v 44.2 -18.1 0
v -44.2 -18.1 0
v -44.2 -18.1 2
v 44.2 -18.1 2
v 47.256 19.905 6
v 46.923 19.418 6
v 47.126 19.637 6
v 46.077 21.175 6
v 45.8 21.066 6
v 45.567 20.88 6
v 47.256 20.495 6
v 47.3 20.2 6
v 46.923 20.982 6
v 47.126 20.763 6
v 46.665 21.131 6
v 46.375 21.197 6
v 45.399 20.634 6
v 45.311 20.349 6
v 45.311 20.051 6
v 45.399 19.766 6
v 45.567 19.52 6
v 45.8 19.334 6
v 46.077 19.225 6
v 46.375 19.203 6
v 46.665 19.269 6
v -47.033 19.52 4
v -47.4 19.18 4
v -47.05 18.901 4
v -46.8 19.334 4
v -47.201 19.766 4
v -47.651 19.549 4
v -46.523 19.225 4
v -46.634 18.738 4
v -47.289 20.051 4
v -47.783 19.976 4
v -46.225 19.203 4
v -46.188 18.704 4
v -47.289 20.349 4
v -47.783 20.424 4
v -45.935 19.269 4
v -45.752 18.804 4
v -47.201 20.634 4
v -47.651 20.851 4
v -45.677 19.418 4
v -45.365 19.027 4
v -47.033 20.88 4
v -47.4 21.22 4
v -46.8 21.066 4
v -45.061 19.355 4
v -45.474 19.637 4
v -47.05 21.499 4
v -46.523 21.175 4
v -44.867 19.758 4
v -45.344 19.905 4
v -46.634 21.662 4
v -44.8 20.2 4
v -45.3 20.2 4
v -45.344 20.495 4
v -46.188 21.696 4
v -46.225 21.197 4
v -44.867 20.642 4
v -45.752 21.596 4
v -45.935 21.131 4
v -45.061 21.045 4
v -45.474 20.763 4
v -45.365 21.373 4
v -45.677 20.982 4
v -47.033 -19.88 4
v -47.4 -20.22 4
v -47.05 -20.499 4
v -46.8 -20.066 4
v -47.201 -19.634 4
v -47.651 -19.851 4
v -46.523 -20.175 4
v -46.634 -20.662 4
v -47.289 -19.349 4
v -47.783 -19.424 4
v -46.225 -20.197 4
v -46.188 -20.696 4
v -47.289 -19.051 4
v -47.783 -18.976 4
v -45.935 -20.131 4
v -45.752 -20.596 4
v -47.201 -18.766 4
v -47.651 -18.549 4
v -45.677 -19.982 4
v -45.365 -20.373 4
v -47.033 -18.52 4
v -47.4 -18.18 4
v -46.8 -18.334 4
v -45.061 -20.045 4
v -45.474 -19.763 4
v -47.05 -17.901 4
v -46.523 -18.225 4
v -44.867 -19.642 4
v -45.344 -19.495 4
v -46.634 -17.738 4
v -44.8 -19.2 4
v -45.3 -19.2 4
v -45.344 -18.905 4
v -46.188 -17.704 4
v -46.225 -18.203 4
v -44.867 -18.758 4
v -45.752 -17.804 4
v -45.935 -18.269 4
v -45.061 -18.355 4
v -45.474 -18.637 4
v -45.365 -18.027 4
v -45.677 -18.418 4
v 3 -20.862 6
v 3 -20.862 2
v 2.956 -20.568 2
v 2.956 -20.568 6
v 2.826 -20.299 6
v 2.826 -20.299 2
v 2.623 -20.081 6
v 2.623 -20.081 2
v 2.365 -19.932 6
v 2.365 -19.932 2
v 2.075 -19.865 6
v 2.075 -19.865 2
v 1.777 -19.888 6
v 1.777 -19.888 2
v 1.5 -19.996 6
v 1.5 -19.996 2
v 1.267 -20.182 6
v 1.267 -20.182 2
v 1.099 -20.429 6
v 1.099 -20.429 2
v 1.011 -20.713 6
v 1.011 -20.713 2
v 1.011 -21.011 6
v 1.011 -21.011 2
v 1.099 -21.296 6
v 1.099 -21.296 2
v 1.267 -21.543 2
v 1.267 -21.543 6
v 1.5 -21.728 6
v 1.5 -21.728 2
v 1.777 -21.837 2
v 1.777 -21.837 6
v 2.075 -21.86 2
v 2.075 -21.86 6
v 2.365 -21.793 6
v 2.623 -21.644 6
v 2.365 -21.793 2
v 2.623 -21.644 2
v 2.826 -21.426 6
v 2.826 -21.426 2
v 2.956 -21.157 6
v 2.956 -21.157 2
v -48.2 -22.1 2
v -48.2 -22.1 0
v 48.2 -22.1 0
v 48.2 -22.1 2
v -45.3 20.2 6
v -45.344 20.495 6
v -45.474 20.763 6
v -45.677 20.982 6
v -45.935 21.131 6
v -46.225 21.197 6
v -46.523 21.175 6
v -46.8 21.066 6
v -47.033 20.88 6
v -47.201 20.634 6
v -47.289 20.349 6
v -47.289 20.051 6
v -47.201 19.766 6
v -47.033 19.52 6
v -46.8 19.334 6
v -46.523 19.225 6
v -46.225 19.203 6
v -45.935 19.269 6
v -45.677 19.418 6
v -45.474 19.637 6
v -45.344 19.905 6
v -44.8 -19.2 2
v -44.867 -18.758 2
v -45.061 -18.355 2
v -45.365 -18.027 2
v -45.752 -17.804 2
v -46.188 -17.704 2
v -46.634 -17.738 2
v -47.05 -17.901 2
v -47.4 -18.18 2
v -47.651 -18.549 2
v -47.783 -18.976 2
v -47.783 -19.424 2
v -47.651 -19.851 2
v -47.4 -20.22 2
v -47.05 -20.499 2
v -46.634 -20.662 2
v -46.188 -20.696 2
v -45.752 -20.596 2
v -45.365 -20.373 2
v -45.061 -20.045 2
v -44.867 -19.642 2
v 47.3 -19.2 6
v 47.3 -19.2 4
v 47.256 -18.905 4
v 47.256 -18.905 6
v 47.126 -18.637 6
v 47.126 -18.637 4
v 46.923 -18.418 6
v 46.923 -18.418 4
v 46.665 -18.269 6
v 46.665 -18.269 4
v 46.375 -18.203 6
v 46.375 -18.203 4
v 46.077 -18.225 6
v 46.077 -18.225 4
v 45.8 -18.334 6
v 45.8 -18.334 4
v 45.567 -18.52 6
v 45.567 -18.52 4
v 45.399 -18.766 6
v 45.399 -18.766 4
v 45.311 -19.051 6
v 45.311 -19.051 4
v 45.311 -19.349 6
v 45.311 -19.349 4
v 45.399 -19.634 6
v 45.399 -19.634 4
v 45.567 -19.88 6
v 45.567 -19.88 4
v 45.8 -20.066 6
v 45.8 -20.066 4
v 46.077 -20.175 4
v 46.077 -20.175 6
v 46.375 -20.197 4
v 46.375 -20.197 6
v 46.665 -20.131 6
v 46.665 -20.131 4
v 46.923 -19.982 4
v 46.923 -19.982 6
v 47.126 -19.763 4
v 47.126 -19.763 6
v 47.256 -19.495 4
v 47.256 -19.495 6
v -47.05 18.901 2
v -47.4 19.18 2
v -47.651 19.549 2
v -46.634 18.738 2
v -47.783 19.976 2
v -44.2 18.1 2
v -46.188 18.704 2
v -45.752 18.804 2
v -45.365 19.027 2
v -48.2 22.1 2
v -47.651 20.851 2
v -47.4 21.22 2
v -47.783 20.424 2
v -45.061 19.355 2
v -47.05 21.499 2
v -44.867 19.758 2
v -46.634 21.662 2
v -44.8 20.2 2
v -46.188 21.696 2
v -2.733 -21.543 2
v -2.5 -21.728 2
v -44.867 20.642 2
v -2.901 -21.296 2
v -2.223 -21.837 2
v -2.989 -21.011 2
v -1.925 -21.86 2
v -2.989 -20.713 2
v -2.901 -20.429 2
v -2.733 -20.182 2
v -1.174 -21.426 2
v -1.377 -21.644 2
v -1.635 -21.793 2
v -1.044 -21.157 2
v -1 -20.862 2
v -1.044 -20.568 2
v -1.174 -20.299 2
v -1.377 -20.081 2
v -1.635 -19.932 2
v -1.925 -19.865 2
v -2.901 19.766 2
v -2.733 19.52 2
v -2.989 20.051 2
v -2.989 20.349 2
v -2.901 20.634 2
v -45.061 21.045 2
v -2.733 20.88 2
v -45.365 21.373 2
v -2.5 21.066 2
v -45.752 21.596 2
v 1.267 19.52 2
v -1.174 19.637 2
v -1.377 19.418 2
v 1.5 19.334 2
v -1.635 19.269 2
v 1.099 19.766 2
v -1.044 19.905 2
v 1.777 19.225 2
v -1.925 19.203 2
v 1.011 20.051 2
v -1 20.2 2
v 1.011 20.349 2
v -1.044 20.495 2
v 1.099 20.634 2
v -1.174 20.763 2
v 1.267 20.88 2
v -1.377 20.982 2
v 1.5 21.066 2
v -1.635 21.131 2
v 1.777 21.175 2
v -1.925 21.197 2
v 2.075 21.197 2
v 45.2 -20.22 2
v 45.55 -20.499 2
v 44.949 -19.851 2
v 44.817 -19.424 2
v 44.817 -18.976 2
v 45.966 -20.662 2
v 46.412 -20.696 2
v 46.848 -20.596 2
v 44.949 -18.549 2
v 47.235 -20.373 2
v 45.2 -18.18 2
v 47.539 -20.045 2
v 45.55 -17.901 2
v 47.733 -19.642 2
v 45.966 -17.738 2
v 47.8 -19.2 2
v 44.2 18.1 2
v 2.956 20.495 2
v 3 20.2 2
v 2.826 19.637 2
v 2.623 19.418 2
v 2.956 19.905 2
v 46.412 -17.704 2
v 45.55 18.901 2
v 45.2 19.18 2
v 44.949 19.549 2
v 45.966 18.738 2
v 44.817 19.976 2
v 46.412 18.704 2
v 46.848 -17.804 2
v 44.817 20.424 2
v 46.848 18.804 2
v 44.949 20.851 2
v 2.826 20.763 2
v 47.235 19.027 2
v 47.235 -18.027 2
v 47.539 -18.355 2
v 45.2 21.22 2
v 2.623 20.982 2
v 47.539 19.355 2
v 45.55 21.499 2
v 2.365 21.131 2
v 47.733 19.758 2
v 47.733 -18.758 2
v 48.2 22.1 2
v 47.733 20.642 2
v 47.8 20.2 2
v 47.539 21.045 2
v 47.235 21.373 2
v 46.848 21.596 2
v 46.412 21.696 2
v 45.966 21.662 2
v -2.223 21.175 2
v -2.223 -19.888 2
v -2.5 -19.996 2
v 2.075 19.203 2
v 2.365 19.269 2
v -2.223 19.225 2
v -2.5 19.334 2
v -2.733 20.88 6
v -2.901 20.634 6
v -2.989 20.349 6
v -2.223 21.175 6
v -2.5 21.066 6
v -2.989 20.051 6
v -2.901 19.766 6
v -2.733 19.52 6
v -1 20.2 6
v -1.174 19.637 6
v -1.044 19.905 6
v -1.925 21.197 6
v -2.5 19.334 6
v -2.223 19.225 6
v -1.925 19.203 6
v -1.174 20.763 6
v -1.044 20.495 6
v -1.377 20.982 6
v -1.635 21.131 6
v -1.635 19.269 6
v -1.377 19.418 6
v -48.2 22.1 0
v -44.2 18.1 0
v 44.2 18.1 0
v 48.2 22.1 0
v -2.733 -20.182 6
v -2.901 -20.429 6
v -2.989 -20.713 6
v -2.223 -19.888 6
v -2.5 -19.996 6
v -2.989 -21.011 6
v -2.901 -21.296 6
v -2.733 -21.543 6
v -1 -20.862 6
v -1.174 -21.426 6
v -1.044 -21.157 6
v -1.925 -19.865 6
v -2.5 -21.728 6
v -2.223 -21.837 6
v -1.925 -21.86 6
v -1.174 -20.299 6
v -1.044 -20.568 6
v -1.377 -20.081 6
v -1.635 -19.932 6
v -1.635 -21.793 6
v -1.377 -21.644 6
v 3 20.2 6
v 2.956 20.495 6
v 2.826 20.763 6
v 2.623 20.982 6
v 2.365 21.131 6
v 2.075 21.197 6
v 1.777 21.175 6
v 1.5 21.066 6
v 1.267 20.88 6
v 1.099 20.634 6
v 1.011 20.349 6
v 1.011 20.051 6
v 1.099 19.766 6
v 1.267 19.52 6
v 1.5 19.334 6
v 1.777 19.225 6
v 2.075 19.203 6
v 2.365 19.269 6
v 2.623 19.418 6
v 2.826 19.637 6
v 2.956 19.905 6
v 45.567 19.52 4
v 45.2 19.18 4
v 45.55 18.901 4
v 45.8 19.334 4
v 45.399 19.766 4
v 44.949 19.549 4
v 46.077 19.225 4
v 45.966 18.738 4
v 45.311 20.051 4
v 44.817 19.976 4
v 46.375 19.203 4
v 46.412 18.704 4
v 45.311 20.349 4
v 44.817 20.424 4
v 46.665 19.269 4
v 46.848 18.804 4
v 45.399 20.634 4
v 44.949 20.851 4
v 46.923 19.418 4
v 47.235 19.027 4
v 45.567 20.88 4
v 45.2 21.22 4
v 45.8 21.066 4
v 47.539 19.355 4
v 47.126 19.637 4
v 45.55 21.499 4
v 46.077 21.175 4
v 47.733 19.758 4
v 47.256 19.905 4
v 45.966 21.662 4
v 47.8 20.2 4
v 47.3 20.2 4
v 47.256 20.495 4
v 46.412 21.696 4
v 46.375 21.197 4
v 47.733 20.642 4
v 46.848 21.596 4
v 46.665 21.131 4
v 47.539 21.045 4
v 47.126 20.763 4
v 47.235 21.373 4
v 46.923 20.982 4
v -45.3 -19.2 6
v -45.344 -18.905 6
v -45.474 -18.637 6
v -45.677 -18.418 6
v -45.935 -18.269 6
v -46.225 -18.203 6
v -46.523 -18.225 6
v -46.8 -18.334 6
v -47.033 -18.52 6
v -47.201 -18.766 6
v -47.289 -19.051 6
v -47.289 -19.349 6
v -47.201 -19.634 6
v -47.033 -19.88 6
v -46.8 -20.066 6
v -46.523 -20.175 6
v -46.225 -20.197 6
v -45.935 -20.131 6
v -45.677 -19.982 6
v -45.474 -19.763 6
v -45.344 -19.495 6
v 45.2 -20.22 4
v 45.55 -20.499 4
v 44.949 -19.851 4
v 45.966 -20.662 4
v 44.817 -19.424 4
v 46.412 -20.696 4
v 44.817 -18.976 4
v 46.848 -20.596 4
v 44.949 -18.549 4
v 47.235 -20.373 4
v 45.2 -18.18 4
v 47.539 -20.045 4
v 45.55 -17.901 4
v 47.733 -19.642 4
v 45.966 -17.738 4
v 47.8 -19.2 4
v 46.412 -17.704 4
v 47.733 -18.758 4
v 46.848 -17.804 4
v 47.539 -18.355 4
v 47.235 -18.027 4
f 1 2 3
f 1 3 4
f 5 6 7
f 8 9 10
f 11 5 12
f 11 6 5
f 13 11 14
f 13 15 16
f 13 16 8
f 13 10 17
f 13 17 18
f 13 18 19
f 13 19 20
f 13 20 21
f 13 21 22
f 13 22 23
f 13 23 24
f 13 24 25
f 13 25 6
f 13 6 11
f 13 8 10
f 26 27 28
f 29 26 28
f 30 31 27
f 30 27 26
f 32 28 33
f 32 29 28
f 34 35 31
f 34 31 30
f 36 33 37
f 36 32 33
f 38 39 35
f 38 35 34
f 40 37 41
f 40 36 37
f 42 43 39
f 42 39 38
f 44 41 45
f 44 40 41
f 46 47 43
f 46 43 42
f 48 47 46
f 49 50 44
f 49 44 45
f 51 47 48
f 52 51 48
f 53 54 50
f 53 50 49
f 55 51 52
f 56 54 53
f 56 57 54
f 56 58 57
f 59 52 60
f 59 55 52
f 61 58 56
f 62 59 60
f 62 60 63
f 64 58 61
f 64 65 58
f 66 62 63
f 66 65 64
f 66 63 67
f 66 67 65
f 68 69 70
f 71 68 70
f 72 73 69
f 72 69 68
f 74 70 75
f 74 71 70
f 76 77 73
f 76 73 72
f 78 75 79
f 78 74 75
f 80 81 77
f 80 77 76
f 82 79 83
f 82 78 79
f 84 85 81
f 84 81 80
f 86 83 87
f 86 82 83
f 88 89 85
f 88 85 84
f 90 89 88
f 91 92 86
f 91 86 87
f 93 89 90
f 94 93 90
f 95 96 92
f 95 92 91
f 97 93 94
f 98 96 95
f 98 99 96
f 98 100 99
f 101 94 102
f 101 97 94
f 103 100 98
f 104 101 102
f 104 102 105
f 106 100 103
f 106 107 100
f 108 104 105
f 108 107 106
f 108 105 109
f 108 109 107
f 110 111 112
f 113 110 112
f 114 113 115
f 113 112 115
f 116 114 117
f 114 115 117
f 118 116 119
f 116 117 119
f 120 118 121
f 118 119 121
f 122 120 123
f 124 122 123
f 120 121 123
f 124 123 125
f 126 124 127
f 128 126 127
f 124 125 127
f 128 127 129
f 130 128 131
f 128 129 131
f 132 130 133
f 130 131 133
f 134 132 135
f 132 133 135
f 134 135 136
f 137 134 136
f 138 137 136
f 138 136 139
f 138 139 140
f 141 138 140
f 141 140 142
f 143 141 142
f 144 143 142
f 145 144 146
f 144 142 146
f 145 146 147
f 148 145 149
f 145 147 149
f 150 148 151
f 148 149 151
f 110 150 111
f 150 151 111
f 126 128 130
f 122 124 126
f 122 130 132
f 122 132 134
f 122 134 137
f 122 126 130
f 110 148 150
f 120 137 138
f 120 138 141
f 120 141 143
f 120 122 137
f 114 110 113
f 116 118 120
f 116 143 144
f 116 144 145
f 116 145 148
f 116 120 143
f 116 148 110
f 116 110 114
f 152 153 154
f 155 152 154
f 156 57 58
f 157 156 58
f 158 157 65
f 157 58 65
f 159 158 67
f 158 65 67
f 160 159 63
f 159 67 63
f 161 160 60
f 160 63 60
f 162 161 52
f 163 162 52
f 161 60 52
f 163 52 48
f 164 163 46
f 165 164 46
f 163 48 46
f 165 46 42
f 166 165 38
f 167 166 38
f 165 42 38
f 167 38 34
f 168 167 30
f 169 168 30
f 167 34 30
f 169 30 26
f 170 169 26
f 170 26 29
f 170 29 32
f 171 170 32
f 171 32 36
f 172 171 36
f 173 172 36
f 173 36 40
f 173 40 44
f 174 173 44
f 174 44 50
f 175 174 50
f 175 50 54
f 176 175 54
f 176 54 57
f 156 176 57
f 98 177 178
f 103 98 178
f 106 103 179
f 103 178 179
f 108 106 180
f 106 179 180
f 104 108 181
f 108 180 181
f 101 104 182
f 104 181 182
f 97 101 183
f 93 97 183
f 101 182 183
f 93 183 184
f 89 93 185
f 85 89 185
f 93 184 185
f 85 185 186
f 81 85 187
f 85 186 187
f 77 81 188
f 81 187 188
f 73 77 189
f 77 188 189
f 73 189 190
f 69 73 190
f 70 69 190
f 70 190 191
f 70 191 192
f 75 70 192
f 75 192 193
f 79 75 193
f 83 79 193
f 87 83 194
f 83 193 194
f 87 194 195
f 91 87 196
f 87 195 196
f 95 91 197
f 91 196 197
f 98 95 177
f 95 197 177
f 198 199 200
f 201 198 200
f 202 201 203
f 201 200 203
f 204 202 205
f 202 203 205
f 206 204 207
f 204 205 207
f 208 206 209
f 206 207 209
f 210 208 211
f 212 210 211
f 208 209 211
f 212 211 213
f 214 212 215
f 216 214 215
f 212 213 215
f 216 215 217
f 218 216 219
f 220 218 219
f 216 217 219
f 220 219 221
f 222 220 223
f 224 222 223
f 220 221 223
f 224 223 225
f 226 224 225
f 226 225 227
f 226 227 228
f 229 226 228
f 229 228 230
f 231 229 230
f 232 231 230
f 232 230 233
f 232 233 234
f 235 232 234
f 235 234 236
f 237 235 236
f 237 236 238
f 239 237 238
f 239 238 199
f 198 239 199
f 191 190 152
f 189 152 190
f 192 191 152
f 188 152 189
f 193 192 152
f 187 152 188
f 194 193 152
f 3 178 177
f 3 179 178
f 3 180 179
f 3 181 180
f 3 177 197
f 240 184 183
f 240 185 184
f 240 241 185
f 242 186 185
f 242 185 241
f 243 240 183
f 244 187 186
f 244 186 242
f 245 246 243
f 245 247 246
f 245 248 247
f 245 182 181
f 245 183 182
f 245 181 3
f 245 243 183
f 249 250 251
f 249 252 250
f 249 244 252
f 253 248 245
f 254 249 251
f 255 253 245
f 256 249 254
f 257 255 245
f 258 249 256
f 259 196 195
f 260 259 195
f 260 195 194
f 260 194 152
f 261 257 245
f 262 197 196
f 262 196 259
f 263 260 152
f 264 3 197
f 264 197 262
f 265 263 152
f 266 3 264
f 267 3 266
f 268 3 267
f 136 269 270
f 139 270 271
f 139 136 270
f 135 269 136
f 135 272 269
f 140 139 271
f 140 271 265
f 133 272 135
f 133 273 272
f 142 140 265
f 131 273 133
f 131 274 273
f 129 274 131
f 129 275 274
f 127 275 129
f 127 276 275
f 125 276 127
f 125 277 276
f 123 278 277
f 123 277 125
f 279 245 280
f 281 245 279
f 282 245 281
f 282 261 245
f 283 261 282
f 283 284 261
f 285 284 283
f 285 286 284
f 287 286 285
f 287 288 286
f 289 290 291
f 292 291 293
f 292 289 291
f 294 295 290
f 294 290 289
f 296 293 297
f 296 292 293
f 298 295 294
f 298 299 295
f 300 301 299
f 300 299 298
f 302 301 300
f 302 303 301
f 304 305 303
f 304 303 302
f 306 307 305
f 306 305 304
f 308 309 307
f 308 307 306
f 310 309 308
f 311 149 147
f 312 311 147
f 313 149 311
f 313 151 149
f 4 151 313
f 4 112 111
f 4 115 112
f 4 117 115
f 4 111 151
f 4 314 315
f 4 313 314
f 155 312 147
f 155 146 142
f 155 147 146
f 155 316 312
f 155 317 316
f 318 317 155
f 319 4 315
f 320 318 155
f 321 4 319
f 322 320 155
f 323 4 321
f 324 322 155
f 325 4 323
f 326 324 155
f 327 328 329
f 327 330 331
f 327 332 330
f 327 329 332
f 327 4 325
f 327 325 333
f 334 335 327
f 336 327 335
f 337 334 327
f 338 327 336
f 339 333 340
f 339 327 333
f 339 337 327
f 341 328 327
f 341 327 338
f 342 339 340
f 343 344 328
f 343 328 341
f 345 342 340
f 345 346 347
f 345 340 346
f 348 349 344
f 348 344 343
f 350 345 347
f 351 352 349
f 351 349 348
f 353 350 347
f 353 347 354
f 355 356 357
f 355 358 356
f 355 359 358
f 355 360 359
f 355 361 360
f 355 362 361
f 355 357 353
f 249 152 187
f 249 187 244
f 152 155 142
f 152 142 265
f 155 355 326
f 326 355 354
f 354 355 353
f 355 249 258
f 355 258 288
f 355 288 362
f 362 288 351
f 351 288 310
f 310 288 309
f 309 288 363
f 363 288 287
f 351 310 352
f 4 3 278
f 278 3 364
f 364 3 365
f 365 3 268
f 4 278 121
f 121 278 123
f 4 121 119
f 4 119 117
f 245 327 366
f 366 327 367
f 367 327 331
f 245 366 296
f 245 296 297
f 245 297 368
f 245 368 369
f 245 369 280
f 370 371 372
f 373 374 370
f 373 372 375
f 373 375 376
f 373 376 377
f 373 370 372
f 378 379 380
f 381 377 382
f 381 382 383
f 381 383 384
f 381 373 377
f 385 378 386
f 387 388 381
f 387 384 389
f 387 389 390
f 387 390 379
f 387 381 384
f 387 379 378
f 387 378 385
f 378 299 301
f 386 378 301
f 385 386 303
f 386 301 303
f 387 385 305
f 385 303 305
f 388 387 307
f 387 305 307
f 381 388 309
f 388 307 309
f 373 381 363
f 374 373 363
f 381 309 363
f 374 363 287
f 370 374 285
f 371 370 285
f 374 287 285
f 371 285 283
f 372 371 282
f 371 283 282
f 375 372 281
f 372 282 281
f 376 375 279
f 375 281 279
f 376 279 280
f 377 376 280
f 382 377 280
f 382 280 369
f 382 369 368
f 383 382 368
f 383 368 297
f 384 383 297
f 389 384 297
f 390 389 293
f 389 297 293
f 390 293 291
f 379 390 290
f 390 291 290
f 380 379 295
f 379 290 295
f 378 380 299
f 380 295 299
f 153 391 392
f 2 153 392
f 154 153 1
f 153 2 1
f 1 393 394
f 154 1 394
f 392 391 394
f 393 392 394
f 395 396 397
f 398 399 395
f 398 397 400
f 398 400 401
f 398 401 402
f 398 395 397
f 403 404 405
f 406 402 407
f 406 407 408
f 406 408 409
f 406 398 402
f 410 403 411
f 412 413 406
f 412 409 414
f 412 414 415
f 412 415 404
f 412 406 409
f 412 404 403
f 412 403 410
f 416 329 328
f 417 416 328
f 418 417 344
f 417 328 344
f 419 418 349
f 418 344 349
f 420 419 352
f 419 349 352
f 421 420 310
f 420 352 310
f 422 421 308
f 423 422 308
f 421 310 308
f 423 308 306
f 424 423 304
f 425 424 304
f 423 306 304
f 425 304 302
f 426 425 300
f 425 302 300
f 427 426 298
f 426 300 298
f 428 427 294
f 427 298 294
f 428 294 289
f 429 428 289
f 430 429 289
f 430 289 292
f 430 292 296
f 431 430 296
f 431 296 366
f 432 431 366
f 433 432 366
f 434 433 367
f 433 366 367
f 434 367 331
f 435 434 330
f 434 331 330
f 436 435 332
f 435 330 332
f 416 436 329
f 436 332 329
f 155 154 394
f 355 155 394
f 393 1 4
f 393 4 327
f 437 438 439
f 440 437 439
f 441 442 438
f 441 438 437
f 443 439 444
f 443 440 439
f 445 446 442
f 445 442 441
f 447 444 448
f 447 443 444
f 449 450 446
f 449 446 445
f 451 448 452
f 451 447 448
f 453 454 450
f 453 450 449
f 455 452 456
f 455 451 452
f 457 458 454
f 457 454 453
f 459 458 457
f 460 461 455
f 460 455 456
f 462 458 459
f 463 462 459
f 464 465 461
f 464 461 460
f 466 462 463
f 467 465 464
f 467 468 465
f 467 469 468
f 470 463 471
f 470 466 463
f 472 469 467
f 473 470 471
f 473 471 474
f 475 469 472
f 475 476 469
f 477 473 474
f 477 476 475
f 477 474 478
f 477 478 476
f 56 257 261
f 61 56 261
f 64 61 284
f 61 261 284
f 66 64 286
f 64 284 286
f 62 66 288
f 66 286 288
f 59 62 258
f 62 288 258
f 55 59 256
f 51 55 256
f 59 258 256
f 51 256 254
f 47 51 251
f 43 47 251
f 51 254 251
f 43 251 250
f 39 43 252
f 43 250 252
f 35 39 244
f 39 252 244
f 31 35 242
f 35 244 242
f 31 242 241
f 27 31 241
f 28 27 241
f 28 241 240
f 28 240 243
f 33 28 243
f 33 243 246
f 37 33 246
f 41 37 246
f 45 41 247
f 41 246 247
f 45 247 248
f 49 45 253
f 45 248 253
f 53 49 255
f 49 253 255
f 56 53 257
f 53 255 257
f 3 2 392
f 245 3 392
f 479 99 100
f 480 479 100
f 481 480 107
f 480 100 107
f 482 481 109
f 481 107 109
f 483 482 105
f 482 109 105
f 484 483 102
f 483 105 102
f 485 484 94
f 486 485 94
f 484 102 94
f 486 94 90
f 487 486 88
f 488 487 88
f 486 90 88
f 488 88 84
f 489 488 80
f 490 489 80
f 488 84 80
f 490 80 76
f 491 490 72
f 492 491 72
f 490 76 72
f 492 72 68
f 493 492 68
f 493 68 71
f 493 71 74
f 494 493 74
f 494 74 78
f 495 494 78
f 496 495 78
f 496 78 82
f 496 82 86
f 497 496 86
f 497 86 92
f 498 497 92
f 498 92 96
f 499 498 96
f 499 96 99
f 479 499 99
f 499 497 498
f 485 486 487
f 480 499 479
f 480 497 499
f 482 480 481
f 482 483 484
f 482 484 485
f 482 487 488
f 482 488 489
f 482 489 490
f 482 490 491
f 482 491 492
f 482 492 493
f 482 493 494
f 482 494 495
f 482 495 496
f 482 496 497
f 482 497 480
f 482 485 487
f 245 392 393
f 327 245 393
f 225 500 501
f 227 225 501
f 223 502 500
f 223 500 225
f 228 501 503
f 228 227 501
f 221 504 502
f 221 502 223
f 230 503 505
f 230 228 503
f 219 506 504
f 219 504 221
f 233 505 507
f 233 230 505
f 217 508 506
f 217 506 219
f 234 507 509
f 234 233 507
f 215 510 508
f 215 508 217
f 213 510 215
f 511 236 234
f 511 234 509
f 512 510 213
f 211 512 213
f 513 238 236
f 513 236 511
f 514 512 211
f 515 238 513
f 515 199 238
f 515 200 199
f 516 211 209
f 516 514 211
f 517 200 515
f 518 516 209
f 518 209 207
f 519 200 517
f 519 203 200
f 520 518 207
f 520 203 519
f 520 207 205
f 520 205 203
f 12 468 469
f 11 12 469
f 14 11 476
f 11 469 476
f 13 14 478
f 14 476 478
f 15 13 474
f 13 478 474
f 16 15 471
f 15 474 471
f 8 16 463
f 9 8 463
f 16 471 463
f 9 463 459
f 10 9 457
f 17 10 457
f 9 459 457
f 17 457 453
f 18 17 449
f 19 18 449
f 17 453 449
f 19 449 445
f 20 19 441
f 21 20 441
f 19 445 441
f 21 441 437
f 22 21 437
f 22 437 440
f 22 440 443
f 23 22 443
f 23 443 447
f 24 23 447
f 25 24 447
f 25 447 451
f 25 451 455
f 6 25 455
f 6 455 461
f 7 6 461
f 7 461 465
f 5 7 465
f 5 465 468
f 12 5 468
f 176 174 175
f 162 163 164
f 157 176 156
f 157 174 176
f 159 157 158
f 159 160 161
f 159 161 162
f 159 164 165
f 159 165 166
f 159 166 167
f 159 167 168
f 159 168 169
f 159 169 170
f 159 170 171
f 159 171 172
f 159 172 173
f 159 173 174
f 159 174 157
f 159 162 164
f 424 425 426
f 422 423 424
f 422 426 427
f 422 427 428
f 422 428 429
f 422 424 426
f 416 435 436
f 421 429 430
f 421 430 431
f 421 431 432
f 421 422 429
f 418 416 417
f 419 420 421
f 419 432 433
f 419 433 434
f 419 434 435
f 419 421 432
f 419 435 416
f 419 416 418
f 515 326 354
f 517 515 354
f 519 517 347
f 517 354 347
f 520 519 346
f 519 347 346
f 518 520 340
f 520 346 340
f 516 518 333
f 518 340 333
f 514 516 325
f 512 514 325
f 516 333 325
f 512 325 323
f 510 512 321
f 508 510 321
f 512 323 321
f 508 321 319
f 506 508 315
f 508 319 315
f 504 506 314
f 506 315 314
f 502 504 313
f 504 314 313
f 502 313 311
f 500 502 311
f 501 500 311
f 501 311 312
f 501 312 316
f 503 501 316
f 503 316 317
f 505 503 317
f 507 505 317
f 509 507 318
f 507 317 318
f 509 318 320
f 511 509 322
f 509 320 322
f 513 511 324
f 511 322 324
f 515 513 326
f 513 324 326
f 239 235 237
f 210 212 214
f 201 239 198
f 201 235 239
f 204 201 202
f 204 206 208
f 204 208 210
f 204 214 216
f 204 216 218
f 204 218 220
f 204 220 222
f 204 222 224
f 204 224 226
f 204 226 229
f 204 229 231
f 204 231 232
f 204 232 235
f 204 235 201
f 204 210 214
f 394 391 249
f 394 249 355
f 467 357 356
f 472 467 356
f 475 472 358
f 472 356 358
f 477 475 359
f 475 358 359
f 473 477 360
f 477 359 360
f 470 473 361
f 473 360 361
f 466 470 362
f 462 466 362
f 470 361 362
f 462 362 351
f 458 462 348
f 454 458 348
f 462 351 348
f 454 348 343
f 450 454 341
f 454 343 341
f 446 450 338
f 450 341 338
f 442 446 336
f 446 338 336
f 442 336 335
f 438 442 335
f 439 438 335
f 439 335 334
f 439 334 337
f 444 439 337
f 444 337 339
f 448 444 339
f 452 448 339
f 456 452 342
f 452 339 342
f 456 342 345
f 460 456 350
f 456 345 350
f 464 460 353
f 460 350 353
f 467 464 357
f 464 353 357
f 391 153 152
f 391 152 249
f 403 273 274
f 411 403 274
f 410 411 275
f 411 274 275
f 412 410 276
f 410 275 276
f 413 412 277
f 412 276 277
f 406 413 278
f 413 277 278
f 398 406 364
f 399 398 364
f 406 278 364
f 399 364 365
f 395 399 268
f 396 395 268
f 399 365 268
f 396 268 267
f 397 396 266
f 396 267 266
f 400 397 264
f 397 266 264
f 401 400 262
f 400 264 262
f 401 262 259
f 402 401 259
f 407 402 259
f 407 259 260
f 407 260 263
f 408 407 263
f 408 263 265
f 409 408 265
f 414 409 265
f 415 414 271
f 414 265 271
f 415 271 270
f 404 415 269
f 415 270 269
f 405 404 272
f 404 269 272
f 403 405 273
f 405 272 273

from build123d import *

# Parameters (mm, degrees)
SKETCH1_W           = 96.4
SKETCH1_H           = 44.2
SKETCH1_W_2         = 88.4
SKETCH1_H_2         = 36.2
BOSS_EXTRUDE1_DEPTH = 2
SKETCH2_R           = 1
BOSS_EXTRUDE2_DEPTH = 4
SKETCH3_R           = 1.5
BOSS_EXTRUDE3_DEPTH = 2


with BuildPart() as part:
    # Sketch1 → Boss-Extrude1 (new body)
    with BuildSketch(Plane.XY):
        Rectangle(SKETCH1_W, SKETCH1_H)
        Rectangle(SKETCH1_W_2, SKETCH1_H_2, mode=Mode.SUBTRACT)
    extrude(amount=BOSS_EXTRUDE1_DEPTH)

    # Sketch2 → Boss-Extrude2 (add)
    with BuildSketch(Plane.XY.offset(2)):
        with Locations((-46.3, 20.2)):
            Circle(SKETCH2_R)
        with Locations((-46.3, -19.2)):
            Circle(SKETCH2_R)
        with Locations((46.3, -19.2)):
            Circle(SKETCH2_R)
        with Locations((46.3, 20.2)):
            Circle(SKETCH2_R)
        with Locations((-2, 20.2)):
            Circle(SKETCH2_R)
        with Locations((-2, -20.862445561)):
            Circle(SKETCH2_R)
        with Locations((2, 20.2)):
            Circle(SKETCH2_R)
        with Locations((2, -20.862445561)):
            Circle(SKETCH2_R)
    extrude(amount=BOSS_EXTRUDE2_DEPTH)

    # Sketch3 → Boss-Extrude3 (add)
    with BuildSketch(Plane.XY.offset(2)):
        with Locations((-46.3, 20.2)):
            Circle(SKETCH3_R)
        with Locations((-46.3, -19.2)):
            Circle(SKETCH3_R)
        with Locations((46.3, -19.2)):
            Circle(SKETCH3_R)
        with Locations((46.3, 20.2)):
            Circle(SKETCH3_R)
    extrude(amount=BOSS_EXTRUDE3_DEPTH)


solid = part.part
